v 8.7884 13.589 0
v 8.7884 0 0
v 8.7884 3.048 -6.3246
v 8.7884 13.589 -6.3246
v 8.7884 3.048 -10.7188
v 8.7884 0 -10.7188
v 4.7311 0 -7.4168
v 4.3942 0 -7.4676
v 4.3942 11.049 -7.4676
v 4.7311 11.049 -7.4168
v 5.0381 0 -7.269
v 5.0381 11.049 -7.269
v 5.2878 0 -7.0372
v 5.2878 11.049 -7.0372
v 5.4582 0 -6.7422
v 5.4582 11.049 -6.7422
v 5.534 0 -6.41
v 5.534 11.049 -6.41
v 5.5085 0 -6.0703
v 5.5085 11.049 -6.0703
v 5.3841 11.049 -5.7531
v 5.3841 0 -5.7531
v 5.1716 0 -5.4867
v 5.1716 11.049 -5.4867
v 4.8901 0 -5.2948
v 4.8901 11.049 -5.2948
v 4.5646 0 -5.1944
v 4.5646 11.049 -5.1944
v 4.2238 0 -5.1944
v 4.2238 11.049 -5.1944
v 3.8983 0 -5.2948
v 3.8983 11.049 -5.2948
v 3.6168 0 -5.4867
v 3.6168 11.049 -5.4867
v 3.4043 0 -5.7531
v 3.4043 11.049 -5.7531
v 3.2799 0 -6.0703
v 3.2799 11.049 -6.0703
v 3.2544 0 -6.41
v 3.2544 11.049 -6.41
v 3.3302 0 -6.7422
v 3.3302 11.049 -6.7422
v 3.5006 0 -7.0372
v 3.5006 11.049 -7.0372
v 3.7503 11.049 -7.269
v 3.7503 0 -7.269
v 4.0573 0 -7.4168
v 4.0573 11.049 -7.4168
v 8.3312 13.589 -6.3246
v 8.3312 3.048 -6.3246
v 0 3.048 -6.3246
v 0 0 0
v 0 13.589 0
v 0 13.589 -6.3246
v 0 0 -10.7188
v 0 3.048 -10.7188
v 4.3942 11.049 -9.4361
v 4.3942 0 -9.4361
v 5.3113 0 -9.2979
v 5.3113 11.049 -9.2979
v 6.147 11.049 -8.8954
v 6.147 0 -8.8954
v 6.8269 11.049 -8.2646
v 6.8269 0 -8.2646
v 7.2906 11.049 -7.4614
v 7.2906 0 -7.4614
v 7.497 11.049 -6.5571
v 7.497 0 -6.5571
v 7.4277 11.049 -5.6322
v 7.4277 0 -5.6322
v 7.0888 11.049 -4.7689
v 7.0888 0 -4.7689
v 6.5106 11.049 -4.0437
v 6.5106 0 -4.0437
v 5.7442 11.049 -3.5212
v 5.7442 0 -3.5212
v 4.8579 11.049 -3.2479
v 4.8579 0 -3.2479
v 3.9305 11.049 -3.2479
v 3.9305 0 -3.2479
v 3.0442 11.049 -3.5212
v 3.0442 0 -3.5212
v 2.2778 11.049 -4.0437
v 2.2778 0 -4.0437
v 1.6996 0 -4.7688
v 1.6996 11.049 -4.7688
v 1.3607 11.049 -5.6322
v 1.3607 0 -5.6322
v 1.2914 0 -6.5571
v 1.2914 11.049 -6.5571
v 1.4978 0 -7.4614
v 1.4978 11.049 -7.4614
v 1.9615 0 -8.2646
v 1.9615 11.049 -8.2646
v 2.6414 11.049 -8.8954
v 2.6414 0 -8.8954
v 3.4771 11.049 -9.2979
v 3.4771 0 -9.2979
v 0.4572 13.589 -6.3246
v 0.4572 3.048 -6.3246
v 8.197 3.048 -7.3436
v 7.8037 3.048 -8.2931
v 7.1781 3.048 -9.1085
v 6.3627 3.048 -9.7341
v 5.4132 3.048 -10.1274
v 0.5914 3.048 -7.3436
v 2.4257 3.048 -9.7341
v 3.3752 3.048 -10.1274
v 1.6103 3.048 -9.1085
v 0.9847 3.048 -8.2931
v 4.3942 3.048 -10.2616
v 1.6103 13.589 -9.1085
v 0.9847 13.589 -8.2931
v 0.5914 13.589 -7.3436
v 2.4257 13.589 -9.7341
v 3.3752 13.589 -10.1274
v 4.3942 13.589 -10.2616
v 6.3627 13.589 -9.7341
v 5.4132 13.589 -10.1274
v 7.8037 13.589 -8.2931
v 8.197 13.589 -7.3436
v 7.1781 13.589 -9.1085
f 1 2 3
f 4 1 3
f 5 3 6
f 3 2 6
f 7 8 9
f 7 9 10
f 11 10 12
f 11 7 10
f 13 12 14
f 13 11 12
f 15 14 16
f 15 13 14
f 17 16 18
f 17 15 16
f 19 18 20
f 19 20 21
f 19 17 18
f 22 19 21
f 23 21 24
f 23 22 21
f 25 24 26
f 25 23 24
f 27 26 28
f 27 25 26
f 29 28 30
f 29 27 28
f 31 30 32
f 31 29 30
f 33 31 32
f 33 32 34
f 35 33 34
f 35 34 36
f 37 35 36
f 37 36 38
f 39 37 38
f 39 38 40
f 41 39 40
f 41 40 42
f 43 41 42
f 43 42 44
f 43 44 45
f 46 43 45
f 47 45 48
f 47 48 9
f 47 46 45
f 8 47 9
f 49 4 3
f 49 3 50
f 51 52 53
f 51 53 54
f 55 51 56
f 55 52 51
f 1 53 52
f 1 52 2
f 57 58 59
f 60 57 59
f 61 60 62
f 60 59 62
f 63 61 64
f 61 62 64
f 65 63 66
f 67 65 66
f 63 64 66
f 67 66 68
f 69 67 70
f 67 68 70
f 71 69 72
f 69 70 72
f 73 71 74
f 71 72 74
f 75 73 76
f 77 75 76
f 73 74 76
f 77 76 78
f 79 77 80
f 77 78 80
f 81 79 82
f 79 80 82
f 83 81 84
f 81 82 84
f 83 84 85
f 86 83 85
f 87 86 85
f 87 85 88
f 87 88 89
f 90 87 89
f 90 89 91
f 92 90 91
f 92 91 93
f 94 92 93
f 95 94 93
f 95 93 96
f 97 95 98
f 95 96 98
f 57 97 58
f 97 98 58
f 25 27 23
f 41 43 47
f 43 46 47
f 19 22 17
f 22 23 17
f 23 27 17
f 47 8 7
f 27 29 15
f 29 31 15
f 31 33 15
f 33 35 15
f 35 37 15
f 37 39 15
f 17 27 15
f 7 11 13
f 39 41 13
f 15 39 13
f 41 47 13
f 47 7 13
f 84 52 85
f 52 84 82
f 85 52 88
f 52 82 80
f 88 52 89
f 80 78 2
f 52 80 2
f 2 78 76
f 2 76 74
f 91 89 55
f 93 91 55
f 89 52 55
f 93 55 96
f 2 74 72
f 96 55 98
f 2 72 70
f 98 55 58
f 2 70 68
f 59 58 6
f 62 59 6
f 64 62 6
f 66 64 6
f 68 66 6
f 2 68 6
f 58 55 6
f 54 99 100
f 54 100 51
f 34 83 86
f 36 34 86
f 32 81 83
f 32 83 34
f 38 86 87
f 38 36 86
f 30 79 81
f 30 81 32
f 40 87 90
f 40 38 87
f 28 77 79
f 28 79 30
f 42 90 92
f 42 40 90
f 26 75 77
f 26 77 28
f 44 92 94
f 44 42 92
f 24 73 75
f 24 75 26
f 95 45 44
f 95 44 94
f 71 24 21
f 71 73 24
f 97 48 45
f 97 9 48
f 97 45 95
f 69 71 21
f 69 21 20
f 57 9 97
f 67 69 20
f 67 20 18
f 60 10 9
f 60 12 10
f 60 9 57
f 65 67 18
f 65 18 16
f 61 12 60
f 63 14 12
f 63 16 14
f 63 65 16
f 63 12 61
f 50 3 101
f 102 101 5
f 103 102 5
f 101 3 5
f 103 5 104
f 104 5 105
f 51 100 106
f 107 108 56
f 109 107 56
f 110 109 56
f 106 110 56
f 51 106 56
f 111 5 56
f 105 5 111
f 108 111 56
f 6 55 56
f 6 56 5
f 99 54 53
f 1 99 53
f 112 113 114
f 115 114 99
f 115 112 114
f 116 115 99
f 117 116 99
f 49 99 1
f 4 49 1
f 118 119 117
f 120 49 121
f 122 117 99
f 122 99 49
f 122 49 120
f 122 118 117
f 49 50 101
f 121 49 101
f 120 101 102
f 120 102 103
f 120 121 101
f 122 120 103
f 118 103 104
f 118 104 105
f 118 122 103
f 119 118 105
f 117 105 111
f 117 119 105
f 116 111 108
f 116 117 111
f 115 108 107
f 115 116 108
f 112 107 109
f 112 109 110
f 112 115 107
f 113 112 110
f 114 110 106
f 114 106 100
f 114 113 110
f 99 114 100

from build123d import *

# Parameters (mm, degrees)
SKETCH1_W           = 8.7884
SKETCH1_H           = 10.7188
BOSS_EXTRUDE1_DEPTH = 13.589
CUT_EXTRUDE1_DEPTH  = 10.541
SKETCH3_R           = 3.1115
SKETCH3_R_2         = 1.143
CUT_EXTRUDE2_DEPTH  = 11.049


with BuildPart() as part:
    # Sketch1 → Boss-Extrude1 (new body)
    with BuildSketch(Plane(origin=(0, 0, 0), x_dir=(1, 0, 0), z_dir=(0, 1, 0))):
        with Locations((4.3942, 5.3594)):
            Rectangle(SKETCH1_W, SKETCH1_H)
    extrude(amount=BOSS_EXTRUDE1_DEPTH)

    # Sketch2 → Cut-Extrude1 (cut)
    with BuildSketch(Plane(origin=(0, 13.589, 0), x_dir=(1, 0, 0), z_dir=(0, 1, 0))):
        with BuildLine():
            Line((0.4572, 6.3246), (0, 6.3246))
            Line((0, 6.3246), (0, 10.7188))
            Line((0, 10.7188), (8.7884, 10.7188))
            Line((8.7884, 10.7188), (8.7884, 6.3246))
            Line((8.7884, 6.3246), (8.3312, 6.3246))
            ThreePointArc((8.3312, 6.3246), (4.3942, 10.2616), (0.4572, 6.3246))
        make_face()
    extrude(amount=-CUT_EXTRUDE1_DEPTH, mode=Mode.SUBTRACT)

    # Sketch3 → Cut-Extrude2 (cut)
    with BuildSketch(Plane.XZ):
        with Locations(Location((4.3942, -6.3246, 0), (0, 0, 270))):
            Circle(SKETCH3_R)
        with Locations(Location((4.3942, -6.3246, 0), (0, 0, 270))):
            Circle(SKETCH3_R_2, mode=Mode.SUBTRACT)
    extrude(amount=-CUT_EXTRUDE2_DEPTH, mode=Mode.SUBTRACT)


solid = part.part
